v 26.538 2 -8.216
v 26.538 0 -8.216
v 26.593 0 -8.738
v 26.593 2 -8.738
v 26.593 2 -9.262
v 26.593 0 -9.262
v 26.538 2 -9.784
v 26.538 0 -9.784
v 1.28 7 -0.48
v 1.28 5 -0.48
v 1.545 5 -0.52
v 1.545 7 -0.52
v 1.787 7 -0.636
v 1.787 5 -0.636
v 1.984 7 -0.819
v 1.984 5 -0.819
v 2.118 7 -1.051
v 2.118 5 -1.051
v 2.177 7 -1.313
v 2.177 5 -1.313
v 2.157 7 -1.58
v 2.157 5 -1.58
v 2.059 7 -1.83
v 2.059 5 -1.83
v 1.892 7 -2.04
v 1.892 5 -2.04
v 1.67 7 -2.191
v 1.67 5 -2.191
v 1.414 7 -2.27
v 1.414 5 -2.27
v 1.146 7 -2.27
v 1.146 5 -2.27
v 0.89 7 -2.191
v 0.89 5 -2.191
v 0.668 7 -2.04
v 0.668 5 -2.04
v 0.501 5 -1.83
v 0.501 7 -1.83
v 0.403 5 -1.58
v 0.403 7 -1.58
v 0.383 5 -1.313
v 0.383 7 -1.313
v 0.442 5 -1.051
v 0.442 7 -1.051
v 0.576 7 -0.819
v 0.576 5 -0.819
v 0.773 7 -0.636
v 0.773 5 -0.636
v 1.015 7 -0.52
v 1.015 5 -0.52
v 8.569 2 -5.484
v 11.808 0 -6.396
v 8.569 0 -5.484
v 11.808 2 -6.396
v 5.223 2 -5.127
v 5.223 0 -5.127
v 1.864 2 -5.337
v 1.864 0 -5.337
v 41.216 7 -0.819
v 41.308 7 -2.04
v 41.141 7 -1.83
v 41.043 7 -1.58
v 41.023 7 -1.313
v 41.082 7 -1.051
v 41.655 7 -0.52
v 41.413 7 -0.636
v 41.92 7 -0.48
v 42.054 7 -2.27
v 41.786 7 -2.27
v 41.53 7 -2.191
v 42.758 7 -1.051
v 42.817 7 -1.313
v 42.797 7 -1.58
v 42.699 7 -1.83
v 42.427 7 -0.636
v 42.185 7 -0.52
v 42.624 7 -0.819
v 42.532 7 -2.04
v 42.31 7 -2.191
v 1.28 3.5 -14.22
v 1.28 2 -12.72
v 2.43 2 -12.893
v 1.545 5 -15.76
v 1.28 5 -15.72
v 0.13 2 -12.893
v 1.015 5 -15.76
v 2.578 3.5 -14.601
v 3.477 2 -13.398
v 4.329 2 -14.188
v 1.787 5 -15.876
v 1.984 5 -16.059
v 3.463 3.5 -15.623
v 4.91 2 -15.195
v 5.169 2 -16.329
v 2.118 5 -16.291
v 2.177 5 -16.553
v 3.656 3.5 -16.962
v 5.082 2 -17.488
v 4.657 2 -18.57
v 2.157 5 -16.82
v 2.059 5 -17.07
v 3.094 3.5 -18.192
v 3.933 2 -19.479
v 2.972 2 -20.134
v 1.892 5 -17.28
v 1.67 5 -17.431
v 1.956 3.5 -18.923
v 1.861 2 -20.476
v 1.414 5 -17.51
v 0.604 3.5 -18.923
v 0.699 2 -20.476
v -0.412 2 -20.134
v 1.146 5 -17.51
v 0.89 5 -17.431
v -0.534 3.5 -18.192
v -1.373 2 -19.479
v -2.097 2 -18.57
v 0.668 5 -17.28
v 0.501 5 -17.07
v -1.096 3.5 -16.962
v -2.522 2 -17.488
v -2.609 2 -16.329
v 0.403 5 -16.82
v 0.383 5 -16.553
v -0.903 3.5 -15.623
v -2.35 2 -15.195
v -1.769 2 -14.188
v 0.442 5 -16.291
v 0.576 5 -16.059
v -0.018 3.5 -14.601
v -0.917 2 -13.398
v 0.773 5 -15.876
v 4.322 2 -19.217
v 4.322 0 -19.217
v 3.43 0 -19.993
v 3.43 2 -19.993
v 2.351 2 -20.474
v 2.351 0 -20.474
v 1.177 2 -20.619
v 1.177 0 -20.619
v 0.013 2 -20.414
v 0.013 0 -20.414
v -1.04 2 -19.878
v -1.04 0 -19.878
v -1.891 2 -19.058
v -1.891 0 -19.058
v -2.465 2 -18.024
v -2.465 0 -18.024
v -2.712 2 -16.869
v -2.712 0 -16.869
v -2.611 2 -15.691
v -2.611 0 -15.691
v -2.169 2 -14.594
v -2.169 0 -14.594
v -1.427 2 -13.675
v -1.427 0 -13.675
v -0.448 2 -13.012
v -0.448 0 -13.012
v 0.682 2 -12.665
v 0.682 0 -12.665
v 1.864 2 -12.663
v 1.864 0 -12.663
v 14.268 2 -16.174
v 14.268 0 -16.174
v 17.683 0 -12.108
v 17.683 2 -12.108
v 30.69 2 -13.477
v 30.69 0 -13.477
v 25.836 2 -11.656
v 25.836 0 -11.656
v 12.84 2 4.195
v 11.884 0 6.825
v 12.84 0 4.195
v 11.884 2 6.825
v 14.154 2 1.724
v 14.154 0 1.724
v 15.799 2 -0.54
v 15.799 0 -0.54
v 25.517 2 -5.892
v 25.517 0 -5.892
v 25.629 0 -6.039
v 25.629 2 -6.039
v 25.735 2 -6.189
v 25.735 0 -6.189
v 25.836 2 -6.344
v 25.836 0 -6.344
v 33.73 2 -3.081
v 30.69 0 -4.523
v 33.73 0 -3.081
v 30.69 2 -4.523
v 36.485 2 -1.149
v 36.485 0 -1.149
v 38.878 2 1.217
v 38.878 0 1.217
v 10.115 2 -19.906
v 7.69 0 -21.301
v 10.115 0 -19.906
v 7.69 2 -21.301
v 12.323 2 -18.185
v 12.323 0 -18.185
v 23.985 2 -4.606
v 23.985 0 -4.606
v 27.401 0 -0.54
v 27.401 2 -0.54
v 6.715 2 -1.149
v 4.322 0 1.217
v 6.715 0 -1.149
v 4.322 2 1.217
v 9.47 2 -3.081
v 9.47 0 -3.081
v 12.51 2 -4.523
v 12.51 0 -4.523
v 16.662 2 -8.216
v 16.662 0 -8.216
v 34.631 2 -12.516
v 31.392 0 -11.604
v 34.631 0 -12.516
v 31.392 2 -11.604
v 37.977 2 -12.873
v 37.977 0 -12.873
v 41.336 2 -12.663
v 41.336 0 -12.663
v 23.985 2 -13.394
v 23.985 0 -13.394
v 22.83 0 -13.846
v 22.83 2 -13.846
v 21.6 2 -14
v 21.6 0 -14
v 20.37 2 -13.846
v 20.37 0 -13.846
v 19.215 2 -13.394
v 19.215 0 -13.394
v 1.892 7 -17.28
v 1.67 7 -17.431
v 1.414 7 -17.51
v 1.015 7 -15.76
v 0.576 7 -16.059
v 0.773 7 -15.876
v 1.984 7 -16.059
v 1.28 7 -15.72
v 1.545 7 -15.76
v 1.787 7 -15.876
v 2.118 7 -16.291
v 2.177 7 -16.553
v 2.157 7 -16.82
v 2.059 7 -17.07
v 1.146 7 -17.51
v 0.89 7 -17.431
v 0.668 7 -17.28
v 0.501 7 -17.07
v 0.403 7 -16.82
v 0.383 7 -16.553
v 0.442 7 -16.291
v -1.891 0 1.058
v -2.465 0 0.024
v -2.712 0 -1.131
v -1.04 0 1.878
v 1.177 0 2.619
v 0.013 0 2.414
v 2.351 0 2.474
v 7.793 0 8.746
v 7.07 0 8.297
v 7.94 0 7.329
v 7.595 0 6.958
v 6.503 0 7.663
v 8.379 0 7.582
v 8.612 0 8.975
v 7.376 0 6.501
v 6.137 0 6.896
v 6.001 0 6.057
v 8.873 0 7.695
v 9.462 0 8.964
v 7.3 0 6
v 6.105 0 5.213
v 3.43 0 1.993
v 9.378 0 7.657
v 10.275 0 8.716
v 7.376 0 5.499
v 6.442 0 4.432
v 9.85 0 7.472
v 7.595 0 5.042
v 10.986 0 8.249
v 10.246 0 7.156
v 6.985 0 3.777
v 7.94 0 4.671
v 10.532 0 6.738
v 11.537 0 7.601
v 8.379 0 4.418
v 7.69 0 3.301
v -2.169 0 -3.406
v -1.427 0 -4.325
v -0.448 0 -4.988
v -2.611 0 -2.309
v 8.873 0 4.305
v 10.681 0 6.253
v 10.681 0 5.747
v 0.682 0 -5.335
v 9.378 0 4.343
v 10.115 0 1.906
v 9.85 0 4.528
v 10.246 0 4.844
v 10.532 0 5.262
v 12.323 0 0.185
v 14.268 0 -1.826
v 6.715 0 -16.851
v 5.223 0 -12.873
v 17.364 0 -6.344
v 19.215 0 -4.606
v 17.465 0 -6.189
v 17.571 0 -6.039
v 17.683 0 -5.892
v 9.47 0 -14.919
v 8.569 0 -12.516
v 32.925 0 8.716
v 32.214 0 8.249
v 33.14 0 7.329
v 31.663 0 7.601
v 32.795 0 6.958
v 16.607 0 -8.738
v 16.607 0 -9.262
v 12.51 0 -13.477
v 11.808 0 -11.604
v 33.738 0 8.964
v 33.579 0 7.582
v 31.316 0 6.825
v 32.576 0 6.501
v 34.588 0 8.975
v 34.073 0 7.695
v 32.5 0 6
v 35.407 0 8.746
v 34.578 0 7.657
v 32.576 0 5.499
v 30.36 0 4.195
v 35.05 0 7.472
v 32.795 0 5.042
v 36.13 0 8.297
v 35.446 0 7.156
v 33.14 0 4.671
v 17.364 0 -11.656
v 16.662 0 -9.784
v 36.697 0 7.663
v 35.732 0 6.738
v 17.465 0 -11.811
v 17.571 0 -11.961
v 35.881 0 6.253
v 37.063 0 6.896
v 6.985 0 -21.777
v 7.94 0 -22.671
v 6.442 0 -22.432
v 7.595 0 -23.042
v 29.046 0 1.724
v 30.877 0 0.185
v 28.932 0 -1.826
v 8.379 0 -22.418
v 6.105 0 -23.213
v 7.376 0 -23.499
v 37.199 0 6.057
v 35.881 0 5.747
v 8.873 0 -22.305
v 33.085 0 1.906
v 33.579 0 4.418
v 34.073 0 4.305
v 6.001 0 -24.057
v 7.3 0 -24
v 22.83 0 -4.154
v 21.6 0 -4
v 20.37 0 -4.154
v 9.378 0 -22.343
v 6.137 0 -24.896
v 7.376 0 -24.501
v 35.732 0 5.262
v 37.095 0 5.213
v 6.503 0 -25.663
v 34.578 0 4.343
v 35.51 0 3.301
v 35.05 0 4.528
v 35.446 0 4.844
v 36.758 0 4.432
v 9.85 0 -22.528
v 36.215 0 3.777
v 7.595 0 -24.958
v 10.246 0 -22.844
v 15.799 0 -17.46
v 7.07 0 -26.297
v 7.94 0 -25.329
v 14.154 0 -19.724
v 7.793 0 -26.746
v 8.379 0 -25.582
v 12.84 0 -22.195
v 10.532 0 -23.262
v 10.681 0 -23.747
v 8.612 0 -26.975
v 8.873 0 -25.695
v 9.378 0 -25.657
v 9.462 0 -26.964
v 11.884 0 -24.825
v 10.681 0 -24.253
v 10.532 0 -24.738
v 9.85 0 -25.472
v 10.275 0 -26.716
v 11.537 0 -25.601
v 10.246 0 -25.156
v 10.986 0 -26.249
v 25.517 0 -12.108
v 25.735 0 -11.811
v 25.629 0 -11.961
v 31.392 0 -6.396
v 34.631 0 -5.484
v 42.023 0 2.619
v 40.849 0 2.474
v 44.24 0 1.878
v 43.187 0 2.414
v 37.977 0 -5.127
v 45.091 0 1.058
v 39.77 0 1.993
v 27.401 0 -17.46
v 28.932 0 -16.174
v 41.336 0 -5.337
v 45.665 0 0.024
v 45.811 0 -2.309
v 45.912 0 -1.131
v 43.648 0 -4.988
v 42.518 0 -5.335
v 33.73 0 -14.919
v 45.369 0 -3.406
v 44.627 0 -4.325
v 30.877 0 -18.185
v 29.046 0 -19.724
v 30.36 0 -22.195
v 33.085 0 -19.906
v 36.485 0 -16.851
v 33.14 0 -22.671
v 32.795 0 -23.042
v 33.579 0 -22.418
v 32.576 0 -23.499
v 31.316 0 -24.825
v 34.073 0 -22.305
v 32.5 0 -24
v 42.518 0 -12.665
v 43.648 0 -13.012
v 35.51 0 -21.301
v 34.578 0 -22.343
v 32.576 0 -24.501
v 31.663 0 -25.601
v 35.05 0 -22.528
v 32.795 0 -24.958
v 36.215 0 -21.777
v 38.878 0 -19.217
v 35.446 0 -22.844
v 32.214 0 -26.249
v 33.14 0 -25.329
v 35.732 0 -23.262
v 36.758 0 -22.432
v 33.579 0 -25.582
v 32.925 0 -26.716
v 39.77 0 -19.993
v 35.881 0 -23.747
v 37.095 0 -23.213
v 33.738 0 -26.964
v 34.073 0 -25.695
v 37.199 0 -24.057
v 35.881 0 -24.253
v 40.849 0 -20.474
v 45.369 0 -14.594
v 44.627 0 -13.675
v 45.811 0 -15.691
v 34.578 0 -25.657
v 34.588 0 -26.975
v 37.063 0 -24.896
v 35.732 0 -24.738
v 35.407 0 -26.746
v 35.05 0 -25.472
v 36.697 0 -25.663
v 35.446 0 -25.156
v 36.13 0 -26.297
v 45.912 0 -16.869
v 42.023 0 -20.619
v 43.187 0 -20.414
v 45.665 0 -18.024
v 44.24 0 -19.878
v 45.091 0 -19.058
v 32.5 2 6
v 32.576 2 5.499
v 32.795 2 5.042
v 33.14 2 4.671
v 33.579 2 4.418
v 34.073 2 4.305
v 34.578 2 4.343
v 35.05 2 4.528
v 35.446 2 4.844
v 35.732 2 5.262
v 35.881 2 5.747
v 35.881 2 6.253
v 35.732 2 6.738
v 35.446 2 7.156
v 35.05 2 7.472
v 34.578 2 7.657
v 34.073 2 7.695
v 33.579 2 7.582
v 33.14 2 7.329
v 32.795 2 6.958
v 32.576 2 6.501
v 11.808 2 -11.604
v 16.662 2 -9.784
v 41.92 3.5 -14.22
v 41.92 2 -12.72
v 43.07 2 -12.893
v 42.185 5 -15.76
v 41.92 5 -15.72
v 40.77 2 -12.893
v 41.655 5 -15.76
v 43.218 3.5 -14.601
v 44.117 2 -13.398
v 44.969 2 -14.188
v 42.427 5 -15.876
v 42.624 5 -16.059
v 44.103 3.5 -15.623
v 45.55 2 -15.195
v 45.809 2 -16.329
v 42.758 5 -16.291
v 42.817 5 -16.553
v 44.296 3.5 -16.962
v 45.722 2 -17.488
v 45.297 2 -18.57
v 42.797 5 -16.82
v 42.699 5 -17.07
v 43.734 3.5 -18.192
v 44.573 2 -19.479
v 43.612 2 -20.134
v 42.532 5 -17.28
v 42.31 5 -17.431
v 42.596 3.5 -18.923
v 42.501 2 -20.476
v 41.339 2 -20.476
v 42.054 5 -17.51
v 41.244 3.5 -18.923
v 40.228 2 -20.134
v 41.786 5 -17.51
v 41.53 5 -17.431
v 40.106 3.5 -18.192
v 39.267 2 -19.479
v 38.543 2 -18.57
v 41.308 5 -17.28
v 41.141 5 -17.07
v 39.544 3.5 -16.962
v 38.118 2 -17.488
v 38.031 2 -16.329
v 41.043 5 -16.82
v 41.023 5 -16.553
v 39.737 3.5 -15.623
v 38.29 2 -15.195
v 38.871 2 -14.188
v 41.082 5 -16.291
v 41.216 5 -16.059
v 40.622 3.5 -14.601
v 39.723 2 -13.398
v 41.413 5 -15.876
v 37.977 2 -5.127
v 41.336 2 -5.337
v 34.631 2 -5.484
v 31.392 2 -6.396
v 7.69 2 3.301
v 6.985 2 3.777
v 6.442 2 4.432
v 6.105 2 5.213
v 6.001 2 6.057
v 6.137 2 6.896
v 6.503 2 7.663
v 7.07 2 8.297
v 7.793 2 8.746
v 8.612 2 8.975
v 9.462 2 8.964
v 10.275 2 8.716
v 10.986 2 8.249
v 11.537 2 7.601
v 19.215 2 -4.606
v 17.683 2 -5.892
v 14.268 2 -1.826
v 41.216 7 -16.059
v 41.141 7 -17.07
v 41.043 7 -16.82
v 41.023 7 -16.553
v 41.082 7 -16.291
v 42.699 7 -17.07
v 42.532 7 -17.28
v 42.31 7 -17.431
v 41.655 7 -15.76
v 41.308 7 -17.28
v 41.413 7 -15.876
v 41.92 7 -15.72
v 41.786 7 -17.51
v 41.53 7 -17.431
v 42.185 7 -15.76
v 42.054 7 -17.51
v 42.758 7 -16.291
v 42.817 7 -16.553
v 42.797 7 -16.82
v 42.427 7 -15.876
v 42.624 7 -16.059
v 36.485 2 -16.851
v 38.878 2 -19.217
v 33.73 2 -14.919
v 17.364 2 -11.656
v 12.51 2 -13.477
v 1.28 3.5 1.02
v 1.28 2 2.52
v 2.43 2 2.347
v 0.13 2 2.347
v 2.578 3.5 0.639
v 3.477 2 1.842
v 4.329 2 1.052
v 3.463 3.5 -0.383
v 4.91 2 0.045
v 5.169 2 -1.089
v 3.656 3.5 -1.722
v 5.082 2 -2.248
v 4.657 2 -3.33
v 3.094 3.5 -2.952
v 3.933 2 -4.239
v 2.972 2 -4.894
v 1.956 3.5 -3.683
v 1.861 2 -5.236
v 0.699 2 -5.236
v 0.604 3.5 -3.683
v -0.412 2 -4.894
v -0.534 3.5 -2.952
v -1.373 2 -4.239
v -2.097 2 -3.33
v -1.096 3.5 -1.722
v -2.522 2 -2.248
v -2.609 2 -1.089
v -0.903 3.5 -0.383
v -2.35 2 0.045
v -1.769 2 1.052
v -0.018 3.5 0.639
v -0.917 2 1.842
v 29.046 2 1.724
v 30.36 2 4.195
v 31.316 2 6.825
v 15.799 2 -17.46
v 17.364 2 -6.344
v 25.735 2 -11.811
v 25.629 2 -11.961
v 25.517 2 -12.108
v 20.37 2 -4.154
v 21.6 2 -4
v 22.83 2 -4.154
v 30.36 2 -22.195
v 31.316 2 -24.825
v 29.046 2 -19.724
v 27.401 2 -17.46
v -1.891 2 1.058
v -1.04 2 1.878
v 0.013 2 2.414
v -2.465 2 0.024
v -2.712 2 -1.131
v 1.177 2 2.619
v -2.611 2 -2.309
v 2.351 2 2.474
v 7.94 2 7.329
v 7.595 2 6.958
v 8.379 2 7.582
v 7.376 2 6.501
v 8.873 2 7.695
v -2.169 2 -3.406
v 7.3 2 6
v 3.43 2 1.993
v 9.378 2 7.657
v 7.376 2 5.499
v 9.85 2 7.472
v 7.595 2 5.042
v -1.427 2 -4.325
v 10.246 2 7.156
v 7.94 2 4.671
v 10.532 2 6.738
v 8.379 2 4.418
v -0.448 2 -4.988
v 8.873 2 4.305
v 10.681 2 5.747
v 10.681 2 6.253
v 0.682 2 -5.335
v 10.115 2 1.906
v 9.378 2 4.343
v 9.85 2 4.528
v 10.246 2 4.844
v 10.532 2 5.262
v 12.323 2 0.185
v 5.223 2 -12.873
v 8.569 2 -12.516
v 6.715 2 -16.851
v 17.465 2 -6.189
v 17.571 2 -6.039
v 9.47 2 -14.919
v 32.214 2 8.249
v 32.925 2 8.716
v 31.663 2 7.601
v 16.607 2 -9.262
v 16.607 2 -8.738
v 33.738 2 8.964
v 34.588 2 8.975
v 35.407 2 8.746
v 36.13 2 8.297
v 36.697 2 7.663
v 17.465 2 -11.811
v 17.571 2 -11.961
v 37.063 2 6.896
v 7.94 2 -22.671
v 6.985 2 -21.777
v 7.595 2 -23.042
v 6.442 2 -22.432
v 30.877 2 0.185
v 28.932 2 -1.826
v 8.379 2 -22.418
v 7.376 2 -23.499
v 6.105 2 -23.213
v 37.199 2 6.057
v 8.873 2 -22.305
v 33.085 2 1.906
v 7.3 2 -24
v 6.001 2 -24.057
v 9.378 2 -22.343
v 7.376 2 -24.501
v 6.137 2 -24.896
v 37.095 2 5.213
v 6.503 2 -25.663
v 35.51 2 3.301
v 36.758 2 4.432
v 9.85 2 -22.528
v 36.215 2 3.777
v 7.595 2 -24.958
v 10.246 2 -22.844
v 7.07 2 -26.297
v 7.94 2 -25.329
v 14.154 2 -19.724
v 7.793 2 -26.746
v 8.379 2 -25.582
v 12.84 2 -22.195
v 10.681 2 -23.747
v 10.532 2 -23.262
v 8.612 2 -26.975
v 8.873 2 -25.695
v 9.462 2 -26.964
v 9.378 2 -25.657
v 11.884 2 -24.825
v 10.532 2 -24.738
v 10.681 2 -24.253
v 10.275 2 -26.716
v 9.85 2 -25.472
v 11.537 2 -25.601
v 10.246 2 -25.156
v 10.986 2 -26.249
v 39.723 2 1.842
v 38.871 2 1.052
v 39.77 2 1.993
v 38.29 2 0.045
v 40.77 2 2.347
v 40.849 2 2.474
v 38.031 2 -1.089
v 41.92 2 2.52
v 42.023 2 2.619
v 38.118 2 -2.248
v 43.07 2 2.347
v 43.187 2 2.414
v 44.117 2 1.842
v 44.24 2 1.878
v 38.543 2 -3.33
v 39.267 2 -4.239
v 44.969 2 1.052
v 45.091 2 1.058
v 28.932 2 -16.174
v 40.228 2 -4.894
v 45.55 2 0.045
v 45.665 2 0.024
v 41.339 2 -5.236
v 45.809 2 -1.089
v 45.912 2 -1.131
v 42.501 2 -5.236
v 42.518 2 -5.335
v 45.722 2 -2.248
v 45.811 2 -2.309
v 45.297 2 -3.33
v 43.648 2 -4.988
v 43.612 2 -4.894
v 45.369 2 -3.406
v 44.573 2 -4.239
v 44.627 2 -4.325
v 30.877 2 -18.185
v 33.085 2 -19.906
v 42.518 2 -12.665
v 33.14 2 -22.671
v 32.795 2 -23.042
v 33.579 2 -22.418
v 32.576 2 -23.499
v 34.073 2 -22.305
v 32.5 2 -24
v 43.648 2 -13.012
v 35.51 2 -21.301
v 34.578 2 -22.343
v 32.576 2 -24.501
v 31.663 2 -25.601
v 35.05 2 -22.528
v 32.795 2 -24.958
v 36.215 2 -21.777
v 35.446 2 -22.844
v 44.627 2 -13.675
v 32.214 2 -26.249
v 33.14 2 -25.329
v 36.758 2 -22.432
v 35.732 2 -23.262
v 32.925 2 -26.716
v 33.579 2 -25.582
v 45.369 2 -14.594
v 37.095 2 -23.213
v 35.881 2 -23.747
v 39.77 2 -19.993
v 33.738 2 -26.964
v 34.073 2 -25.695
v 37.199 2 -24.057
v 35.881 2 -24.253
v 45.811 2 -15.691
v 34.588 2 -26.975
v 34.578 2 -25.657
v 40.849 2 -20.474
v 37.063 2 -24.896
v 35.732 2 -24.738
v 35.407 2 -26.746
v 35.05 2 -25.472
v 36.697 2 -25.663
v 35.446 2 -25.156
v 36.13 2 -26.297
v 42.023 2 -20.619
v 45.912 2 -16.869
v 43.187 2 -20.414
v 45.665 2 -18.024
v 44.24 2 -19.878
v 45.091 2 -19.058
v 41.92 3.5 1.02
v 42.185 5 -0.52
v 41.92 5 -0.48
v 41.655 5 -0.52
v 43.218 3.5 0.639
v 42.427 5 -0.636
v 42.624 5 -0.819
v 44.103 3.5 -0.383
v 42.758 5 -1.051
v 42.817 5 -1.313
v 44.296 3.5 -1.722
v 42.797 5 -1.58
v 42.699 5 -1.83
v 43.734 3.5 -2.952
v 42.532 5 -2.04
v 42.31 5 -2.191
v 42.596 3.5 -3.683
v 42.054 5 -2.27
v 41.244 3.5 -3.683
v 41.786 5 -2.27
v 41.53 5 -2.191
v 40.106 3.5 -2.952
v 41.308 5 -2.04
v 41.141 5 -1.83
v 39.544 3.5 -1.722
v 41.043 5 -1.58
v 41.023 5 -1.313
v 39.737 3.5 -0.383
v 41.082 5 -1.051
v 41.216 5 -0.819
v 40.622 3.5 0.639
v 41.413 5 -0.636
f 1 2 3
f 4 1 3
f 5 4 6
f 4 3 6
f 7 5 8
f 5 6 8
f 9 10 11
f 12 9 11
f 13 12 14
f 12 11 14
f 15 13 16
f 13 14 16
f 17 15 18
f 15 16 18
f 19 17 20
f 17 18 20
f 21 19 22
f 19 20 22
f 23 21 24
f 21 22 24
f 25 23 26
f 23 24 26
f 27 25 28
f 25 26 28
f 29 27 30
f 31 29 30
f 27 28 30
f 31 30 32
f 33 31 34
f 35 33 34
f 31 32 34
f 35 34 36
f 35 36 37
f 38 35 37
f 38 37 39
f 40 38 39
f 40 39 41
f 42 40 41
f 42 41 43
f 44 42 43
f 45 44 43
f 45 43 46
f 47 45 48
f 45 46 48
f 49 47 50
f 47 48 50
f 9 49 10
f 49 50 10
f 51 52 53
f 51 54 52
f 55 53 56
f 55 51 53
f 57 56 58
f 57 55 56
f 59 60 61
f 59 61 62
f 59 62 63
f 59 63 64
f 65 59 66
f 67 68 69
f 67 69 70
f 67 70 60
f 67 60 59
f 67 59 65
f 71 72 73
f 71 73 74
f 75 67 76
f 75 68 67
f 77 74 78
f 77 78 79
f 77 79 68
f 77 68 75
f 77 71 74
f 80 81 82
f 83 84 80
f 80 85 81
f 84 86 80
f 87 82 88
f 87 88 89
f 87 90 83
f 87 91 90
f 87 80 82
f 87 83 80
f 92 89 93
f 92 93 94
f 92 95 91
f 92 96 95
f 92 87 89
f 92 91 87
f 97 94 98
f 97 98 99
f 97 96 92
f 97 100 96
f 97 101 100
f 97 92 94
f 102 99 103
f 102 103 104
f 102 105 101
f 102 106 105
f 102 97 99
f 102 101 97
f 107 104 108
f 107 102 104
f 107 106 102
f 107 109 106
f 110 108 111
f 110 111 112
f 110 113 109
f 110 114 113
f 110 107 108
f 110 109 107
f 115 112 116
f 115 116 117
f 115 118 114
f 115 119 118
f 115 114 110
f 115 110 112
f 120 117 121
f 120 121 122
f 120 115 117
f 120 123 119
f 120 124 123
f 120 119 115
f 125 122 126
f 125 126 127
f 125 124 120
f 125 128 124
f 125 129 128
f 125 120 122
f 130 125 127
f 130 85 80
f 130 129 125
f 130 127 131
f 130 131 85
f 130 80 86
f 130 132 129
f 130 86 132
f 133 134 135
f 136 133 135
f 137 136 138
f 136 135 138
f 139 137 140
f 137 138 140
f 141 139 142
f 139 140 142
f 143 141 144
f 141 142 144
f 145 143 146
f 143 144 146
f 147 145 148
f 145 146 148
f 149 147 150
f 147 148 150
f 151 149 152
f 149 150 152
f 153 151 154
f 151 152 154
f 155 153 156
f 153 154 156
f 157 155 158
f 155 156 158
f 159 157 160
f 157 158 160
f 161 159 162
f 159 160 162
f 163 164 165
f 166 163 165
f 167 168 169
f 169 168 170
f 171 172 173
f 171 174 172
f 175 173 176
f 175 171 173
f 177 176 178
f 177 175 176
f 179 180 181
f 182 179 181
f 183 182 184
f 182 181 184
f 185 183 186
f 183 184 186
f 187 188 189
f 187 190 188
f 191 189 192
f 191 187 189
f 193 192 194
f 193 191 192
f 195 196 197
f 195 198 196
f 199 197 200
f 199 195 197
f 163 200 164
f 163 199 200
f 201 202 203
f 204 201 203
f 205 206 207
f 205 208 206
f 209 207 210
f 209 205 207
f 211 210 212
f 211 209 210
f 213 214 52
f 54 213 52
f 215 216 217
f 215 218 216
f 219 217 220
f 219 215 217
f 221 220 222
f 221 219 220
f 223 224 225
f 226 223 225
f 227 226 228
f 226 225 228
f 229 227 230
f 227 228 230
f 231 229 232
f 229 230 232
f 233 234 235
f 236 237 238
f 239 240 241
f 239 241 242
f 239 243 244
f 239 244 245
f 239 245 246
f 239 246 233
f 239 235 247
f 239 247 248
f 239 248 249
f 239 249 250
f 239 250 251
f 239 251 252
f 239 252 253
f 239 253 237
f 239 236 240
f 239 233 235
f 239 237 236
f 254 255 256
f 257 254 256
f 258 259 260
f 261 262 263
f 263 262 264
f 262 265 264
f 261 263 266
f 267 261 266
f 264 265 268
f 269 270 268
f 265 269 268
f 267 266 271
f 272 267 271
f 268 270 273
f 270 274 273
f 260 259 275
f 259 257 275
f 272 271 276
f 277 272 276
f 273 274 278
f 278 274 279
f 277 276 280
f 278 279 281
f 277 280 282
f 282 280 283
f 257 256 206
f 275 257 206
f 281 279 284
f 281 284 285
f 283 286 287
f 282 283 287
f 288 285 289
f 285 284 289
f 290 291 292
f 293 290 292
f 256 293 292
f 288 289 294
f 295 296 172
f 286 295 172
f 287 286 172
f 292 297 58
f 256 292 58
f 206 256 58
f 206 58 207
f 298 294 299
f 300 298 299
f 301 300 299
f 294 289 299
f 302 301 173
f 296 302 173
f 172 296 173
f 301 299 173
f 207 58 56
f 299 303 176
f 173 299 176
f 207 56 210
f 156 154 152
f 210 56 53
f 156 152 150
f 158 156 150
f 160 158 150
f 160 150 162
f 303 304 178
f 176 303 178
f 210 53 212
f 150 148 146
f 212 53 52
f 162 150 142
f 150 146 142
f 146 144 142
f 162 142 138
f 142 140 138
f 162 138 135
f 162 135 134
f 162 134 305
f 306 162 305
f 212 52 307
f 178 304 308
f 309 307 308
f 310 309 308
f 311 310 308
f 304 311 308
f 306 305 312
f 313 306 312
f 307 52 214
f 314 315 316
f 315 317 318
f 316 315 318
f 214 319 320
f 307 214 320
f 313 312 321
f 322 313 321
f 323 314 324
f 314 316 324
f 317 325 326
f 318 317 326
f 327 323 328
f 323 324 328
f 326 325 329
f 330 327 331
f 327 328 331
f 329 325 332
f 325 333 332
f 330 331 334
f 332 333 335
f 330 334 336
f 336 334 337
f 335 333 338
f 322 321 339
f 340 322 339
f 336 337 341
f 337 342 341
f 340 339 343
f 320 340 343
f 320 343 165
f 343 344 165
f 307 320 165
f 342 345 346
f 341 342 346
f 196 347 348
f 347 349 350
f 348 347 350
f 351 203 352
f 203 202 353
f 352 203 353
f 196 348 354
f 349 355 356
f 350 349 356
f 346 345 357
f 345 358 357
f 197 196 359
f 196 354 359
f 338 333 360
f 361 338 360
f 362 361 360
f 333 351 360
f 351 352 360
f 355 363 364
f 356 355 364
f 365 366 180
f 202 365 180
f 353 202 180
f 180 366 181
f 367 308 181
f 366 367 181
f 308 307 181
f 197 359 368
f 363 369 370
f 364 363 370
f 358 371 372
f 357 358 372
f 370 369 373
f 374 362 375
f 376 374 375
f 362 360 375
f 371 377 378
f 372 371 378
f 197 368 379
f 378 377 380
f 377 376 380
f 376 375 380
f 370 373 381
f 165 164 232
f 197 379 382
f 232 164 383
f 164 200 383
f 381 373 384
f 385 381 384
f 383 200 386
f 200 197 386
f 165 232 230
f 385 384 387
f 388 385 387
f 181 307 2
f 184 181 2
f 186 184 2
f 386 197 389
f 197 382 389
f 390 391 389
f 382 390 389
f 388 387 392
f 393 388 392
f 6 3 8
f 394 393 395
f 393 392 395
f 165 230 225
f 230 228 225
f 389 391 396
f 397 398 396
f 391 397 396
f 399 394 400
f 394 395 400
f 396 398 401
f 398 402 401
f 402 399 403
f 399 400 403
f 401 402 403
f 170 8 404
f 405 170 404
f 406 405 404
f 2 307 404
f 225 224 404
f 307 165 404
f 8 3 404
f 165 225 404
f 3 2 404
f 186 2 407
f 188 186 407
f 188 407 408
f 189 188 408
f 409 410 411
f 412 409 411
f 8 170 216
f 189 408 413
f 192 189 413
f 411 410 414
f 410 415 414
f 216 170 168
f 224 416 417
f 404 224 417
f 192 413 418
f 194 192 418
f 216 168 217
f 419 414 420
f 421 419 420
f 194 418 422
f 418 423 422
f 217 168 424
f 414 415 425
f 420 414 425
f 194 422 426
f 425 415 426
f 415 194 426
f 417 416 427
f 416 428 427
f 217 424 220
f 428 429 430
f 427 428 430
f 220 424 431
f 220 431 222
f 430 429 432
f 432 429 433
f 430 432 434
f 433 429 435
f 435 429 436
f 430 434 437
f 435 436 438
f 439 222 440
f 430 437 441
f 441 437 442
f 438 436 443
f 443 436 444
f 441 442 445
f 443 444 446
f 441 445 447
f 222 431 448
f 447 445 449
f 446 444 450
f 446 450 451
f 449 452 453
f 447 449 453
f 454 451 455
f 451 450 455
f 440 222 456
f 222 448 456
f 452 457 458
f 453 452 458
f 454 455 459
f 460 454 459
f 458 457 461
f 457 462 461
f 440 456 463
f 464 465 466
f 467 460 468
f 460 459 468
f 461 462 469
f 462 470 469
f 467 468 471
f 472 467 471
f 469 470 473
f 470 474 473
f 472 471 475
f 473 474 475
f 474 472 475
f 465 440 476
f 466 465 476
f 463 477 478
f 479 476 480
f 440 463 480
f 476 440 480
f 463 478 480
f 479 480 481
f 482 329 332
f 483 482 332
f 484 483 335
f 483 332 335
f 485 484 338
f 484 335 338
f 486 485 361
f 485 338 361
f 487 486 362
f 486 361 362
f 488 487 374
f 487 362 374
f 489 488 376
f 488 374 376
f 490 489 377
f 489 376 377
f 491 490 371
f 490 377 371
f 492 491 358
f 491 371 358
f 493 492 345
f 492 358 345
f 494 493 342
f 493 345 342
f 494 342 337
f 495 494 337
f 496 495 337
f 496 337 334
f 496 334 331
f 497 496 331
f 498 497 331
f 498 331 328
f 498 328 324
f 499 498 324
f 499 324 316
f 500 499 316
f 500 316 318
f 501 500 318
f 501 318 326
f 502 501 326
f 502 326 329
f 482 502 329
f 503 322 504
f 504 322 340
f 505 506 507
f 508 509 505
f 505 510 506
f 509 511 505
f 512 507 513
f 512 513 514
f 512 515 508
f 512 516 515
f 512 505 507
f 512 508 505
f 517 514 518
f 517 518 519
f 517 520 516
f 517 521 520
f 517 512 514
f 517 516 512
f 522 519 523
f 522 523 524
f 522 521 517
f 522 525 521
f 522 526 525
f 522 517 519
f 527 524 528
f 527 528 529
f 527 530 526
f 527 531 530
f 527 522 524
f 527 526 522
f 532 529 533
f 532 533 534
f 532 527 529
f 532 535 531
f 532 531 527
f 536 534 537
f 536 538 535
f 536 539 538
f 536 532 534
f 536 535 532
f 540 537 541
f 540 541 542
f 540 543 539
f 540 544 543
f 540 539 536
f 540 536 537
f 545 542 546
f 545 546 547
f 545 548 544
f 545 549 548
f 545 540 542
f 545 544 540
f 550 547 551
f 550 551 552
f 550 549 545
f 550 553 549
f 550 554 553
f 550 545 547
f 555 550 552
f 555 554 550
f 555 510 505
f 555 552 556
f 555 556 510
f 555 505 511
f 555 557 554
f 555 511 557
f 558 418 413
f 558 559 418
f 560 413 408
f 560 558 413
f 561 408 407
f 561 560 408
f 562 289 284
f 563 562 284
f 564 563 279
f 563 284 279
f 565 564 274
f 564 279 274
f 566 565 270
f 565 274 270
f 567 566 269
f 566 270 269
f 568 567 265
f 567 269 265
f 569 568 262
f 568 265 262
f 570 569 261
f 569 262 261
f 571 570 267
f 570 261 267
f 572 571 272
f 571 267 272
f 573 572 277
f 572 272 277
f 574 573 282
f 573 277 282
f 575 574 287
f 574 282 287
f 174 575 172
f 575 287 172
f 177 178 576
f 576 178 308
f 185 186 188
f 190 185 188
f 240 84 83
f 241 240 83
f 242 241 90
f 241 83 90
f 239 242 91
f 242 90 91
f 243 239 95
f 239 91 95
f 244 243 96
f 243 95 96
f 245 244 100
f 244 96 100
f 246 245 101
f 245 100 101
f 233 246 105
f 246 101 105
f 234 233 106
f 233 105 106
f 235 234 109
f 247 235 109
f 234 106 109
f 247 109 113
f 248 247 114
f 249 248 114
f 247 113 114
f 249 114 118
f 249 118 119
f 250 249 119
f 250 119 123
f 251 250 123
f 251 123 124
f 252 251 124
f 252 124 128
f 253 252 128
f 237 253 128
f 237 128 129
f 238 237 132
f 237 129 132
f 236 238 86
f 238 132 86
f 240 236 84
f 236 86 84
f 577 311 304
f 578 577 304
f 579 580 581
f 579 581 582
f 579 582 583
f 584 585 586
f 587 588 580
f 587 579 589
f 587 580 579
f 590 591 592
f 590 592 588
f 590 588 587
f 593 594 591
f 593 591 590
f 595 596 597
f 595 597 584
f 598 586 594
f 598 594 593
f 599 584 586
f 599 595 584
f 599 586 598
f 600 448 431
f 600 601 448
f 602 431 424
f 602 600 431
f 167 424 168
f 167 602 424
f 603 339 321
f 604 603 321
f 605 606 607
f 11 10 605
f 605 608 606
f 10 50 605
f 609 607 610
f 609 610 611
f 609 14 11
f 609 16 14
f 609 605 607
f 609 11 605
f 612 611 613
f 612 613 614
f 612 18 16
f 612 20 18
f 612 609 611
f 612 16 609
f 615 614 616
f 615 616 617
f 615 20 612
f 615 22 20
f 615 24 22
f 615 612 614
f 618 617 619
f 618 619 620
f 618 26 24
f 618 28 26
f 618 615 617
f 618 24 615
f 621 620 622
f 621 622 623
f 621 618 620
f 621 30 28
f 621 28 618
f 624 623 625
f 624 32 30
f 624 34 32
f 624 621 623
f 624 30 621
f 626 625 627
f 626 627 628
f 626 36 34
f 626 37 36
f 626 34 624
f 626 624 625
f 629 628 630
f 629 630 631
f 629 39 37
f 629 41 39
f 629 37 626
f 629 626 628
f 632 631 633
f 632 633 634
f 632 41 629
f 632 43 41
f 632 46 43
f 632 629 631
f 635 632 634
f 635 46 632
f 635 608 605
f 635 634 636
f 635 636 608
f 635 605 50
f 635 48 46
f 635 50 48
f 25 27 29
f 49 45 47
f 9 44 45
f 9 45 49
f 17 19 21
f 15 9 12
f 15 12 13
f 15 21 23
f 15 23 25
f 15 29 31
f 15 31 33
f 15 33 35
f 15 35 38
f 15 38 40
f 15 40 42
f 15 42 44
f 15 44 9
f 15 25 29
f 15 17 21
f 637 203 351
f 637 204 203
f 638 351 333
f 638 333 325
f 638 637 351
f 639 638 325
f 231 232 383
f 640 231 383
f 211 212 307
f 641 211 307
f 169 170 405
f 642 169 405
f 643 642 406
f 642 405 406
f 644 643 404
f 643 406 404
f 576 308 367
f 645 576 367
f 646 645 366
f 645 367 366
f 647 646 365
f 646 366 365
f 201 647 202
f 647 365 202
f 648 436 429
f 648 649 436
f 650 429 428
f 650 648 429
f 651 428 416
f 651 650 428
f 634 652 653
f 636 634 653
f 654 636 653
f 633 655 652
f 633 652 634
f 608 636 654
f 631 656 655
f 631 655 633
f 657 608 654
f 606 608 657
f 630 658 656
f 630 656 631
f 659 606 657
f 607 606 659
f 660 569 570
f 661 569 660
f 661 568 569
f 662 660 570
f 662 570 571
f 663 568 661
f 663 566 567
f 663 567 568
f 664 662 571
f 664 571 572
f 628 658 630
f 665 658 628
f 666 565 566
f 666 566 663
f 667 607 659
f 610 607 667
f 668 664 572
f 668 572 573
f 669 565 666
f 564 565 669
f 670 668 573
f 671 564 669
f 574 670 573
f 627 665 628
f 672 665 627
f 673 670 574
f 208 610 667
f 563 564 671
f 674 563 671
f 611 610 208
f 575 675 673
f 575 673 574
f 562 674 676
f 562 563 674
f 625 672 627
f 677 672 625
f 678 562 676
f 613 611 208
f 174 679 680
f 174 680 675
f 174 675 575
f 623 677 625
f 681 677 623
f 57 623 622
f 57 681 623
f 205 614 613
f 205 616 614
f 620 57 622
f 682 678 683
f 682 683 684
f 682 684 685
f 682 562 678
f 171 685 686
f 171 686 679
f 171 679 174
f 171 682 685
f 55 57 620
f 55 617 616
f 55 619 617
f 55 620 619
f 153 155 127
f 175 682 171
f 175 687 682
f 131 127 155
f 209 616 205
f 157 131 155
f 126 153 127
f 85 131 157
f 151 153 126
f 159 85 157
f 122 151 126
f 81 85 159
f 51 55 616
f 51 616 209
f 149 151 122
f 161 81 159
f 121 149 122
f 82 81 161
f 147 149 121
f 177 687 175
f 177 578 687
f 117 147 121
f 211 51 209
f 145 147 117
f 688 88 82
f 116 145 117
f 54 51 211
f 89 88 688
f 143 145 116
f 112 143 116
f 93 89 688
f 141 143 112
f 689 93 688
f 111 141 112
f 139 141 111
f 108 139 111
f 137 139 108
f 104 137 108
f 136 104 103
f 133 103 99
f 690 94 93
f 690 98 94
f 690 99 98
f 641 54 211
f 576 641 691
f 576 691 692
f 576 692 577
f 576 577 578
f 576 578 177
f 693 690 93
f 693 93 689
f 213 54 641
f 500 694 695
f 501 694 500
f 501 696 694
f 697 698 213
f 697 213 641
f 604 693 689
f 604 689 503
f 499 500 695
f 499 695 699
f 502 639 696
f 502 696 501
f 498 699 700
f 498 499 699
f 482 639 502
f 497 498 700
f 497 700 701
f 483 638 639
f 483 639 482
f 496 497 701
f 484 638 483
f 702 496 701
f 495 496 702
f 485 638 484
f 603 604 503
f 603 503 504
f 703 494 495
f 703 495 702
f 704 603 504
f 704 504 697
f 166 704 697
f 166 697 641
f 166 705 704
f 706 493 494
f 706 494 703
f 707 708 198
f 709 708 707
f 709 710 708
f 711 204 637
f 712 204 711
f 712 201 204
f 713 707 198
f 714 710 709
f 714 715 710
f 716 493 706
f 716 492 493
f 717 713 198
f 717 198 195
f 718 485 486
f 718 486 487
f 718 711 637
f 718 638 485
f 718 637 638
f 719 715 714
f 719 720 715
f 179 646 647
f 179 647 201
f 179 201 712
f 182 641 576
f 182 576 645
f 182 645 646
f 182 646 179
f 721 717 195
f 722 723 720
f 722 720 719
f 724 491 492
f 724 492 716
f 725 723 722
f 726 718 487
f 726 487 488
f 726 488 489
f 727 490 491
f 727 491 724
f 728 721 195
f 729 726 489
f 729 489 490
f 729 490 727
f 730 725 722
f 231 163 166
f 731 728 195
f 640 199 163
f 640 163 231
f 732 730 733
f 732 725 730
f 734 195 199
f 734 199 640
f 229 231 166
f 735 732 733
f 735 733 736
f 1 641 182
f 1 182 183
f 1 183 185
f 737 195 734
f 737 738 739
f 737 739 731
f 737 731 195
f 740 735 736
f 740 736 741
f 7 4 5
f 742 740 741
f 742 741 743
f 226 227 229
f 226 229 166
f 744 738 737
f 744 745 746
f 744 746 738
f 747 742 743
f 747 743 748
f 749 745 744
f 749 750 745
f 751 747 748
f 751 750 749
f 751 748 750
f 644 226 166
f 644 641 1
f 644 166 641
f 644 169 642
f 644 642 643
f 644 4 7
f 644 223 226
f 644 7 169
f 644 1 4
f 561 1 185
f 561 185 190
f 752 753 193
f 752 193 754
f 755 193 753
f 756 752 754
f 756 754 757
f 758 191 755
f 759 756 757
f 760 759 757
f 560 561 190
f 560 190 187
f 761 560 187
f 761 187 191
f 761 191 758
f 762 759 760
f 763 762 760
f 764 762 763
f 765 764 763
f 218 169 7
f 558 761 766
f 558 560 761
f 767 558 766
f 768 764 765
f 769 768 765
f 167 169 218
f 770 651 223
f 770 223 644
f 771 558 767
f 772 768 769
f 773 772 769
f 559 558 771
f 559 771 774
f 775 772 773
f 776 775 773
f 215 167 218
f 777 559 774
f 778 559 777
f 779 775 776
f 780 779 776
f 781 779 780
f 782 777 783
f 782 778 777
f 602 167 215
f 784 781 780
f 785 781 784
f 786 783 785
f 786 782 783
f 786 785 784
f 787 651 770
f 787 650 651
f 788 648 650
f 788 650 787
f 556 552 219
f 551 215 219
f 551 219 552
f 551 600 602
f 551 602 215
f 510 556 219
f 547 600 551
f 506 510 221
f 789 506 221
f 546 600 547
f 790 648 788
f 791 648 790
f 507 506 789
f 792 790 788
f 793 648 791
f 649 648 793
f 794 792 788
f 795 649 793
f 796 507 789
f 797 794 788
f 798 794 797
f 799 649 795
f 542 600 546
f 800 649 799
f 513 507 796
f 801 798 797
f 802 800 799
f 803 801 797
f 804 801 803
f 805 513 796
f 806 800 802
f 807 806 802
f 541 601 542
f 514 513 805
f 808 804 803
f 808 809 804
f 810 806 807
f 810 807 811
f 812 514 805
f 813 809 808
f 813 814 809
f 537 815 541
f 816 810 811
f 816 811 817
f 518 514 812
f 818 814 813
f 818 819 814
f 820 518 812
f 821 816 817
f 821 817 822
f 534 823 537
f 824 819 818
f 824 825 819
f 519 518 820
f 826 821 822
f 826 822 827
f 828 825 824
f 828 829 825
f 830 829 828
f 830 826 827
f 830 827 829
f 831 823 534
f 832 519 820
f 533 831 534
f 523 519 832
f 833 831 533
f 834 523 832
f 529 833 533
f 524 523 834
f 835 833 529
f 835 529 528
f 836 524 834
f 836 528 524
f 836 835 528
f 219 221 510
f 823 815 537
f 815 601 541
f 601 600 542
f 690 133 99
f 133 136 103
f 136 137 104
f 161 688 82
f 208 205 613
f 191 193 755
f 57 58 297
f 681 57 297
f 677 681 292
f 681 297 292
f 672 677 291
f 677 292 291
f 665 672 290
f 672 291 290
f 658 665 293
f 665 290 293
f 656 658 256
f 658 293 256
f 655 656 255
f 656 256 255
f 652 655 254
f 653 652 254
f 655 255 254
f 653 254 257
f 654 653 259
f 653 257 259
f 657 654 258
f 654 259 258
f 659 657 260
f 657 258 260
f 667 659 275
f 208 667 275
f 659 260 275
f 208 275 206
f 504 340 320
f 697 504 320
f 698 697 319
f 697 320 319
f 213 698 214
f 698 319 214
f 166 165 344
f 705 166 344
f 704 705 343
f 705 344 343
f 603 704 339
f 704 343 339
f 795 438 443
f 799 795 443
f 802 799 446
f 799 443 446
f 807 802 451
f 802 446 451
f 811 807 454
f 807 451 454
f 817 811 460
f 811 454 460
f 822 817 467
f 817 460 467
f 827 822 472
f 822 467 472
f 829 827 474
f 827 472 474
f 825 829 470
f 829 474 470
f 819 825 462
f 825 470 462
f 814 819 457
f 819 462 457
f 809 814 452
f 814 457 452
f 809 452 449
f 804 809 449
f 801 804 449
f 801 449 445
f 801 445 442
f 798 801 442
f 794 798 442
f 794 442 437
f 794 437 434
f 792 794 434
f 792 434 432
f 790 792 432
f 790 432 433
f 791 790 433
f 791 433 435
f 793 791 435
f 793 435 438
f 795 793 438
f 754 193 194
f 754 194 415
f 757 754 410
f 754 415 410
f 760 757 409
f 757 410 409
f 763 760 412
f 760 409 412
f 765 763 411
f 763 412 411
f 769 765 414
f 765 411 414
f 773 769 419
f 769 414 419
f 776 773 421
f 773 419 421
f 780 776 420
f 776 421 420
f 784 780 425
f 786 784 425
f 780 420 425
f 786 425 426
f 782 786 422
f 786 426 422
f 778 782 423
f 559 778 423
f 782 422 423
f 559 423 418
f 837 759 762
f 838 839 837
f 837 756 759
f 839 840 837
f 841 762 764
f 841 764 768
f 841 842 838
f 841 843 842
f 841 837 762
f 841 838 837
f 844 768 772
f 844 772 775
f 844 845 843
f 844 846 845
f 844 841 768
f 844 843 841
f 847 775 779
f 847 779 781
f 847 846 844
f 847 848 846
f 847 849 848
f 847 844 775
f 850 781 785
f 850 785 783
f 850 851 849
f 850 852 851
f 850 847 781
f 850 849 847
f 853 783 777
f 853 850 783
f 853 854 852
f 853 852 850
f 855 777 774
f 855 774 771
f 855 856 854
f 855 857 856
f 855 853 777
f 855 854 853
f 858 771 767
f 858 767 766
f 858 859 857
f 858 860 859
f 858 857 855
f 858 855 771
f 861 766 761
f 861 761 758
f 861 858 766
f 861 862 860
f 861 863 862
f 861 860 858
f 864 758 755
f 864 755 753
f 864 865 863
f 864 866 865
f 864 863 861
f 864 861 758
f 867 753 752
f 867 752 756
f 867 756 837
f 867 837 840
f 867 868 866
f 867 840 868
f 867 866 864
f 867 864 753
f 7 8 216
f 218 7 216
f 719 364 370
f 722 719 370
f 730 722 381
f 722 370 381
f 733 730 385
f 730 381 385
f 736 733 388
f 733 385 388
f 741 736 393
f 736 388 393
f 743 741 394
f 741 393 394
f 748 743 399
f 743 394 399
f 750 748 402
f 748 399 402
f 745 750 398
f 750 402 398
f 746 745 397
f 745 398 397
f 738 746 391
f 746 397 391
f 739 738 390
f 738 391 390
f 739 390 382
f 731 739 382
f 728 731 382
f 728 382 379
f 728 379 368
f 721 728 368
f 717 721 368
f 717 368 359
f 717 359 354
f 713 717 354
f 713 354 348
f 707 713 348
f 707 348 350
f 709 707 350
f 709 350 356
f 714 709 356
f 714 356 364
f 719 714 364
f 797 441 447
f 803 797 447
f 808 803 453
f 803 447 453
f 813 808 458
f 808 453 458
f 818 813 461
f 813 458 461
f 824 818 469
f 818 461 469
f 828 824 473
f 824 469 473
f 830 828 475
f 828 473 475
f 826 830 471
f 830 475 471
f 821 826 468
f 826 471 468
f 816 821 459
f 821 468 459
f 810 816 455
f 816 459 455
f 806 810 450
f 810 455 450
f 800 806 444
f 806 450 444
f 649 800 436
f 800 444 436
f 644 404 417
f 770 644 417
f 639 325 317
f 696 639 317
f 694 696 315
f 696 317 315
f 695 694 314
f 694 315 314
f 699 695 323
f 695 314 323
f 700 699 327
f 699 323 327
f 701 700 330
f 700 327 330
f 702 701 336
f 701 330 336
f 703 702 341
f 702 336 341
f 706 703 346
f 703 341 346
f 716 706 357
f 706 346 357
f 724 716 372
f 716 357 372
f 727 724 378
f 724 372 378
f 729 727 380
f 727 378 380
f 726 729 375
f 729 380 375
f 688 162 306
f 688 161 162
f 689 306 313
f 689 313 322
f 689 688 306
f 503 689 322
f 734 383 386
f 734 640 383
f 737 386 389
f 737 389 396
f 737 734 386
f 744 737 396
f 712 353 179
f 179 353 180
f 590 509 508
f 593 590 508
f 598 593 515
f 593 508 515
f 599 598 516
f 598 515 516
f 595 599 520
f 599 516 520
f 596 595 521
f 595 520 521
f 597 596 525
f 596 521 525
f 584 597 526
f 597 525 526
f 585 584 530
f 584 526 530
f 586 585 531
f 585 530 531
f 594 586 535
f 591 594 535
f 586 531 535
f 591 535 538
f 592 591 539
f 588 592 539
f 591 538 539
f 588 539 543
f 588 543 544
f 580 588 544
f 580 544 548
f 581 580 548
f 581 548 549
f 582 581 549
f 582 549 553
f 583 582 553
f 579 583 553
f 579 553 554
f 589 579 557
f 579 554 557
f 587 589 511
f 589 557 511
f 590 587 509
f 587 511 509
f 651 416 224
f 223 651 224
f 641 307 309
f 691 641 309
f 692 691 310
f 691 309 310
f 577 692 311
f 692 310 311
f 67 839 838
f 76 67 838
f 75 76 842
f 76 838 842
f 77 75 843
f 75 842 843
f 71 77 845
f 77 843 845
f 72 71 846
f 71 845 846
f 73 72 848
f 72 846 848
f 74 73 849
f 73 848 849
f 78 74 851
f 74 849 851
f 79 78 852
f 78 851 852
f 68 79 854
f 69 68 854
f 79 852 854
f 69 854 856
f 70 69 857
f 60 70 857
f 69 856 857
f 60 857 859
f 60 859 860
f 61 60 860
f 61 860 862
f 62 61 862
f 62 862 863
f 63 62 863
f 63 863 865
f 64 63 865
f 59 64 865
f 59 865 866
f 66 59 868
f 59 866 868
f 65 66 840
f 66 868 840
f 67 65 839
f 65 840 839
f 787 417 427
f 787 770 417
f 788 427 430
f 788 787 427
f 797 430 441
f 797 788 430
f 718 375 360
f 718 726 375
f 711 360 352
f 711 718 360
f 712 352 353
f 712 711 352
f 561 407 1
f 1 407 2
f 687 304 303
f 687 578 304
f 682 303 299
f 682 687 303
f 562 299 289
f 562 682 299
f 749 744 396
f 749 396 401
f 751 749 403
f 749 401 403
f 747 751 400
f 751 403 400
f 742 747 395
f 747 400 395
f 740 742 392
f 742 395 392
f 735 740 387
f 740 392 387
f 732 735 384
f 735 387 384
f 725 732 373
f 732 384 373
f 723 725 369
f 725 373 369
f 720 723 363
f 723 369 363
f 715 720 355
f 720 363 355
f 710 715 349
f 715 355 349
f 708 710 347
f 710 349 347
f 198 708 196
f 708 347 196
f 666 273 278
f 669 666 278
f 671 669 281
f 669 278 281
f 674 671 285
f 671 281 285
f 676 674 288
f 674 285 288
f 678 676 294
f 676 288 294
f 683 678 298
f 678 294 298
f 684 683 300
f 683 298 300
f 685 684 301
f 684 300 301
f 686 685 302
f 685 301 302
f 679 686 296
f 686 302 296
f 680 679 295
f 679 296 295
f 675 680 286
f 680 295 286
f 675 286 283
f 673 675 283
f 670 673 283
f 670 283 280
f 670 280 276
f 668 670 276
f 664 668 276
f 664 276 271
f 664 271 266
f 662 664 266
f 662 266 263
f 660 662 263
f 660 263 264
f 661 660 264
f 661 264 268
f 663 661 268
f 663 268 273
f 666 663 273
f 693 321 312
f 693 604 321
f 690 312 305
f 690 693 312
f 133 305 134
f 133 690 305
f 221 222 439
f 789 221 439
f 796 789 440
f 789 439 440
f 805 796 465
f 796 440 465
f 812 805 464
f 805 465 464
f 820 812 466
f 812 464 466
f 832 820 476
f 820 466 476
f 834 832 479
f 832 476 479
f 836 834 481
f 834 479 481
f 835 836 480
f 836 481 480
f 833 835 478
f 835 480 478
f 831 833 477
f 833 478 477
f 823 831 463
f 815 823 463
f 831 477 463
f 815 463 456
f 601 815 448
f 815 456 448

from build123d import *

# Parameters (mm, degrees)
SKETCH1_R            = 5
BOSS_EXTRUDE1_DEPTH  = 2
FILLET1_R            = 20
M3_CLEARANCE_HOLE2_D = 3.4
SKETCH5_R            = 0.9
BOSS_EXTRUDE2_DEPTH  = 5
CHAMFER1_SIZE        = 3


with BuildPart() as part:
    # Sketch1 → Boss-Extrude1 (new body)
    with BuildSketch(Plane(origin=(0, 0, 0), x_dir=(1, 0, 0), z_dir=(0, 1, 0))):
        with Locations((21.6, 9)):
            Circle(SKETCH1_R)
        with BuildLine():
            Line((24.81621403, 11.274080729), (33.146482921, 21.191067504))
            ThreePointArc((33.146482921, 21.191067504), (36.129576259, 26.297114594), (31.615073192, 22.477451677))
            Line((31.615073192, 22.477451677), (21.6, 10.554745497))
            Line((21.6, 10.554745497), (11.584926808, 22.477451677))
            ThreePointArc((11.584926808, 22.477451677), (7.070423741, 26.297114594), (10.053517079, 21.191067504))
            Line((10.053517079, 21.191067504), (18.38378597, 11.274080729))
            Line((18.38378597, 11.274080729), (5.257510753, 16.196433936))
            ThreePointArc((5.257510753, 16.196433936), (-2.46531671, 18.024493766), (4.55526387, 14.323775581))
            Line((4.55526387, 14.323775581), (18.751998752, 9))
            Line((18.751998752, 9), (4.55526387, 3.676224419))
            ThreePointArc((4.55526387, 3.676224419), (-2.46531671, -0.024493766), (5.257510753, 1.803566064))
            Line((5.257510753, 1.803566064), (18.38378597, 6.725919271))
            Line((18.38378597, 6.725919271), (10.053517079, -3.191067504))
            ThreePointArc((10.053517079, -3.191067504), (7.070423741, -8.297114594), (11.584926808, -4.477451677))
            Line((11.584926808, -4.477451677), (21.6, 7.445254503))
            Line((21.6, 7.445254503), (31.615073192, -4.477451677))
            ThreePointArc((31.615073192, -4.477451677), (36.129576259, -8.297114594), (33.146482921, -3.191067504))
            Line((33.146482921, -3.191067504), (24.81621403, 6.725919271))
            Line((24.81621403, 6.725919271), (37.942489247, 1.803566064))
            ThreePointArc((37.942489247, 1.803566064), (45.66531671, -0.024493766), (38.64473613, 3.676224419))
            Line((38.64473613, 3.676224419), (24.448001248, 9))
            Line((24.448001248, 9), (38.64473613, 14.323775581))
            ThreePointArc((38.64473613, 14.323775581), (45.66531671, 18.024493766), (37.942489247, 16.196433936))
            Line((37.942489247, 16.196433936), (24.81621403, 11.274080729))
        make_face()
    extrude(amount=BOSS_EXTRUDE1_DEPTH)

    # Fillet1
    fillet1_edges = [part.edges().sort_by_distance(p)[0] for p in [
        (5.257510753, 1, -16.196433936),
        (4.55526387, 1, -14.323775581),
        (4.55526387, 1, -3.676224419),
        (5.257510753, 1, -1.803566064),
        (10.053517079, 1, 3.191067504),
        (11.584926808, 1, 4.477451677),
        (31.615073192, 1, 4.477451677),
        (33.146482921, 1, 3.191067504),
        (37.942489247, 1, -1.803566064),
        (38.64473613, 1, -3.676224419),
        (38.64473613, 1, -14.323775581),
        (37.942489247, 1, -16.196433936),
        (33.146482921, 1, -21.191067504),
        (31.615073192, 1, -22.477451677),
        (11.584926808, 1, -22.477451677),
        (10.053517079, 1, -21.191067504),
    ]]
    fillet(fillet1_edges, radius=FILLET1_R)

    # M3 Clearance Hole2 (through all)
    with Locations(Plane(origin=(0, 2, 0), x_dir=(1, 0, 0), z_dir=(0, 1, 0))):
        with Locations((9, -6), (34.2, -6), (34.2, 24), (9, 24)):
            Hole(M3_CLEARANCE_HOLE2_D / 2)

    # Sketch5 → Boss-Extrude2 (add)
    with BuildSketch(Plane(origin=(0, 2, 0), x_dir=(1, 0, 0), z_dir=(0, 1, 0))):
        with Locations(Location((1.28, 1.38, 0), (0, 0, 270))):
            Circle(SKETCH5_R)
        with Locations(Location((41.92, 1.38, 0), (0, 0, 270))):
            Circle(SKETCH5_R)
        with Locations(Location((41.92, 16.62, 0), (0, 0, 270))):
            Circle(SKETCH5_R)
        with Locations(Location((1.28, 16.62, 0), (0, 0, 270))):
            Circle(SKETCH5_R)
    extrude(amount=BOSS_EXTRUDE2_DEPTH)

    # Chamfer1
    chamfer1_edges = [part.edges().sort_by_distance(p)[0] for p in [
        (1.28, 2, -2.28),
        (41.92, 2, -2.28),
        (41.92, 2, -17.52),
        (1.28, 2, -17.52),
    ]]
    chamfer(chamfer1_edges, length=CHAMFER1_SIZE)


solid = part.part
